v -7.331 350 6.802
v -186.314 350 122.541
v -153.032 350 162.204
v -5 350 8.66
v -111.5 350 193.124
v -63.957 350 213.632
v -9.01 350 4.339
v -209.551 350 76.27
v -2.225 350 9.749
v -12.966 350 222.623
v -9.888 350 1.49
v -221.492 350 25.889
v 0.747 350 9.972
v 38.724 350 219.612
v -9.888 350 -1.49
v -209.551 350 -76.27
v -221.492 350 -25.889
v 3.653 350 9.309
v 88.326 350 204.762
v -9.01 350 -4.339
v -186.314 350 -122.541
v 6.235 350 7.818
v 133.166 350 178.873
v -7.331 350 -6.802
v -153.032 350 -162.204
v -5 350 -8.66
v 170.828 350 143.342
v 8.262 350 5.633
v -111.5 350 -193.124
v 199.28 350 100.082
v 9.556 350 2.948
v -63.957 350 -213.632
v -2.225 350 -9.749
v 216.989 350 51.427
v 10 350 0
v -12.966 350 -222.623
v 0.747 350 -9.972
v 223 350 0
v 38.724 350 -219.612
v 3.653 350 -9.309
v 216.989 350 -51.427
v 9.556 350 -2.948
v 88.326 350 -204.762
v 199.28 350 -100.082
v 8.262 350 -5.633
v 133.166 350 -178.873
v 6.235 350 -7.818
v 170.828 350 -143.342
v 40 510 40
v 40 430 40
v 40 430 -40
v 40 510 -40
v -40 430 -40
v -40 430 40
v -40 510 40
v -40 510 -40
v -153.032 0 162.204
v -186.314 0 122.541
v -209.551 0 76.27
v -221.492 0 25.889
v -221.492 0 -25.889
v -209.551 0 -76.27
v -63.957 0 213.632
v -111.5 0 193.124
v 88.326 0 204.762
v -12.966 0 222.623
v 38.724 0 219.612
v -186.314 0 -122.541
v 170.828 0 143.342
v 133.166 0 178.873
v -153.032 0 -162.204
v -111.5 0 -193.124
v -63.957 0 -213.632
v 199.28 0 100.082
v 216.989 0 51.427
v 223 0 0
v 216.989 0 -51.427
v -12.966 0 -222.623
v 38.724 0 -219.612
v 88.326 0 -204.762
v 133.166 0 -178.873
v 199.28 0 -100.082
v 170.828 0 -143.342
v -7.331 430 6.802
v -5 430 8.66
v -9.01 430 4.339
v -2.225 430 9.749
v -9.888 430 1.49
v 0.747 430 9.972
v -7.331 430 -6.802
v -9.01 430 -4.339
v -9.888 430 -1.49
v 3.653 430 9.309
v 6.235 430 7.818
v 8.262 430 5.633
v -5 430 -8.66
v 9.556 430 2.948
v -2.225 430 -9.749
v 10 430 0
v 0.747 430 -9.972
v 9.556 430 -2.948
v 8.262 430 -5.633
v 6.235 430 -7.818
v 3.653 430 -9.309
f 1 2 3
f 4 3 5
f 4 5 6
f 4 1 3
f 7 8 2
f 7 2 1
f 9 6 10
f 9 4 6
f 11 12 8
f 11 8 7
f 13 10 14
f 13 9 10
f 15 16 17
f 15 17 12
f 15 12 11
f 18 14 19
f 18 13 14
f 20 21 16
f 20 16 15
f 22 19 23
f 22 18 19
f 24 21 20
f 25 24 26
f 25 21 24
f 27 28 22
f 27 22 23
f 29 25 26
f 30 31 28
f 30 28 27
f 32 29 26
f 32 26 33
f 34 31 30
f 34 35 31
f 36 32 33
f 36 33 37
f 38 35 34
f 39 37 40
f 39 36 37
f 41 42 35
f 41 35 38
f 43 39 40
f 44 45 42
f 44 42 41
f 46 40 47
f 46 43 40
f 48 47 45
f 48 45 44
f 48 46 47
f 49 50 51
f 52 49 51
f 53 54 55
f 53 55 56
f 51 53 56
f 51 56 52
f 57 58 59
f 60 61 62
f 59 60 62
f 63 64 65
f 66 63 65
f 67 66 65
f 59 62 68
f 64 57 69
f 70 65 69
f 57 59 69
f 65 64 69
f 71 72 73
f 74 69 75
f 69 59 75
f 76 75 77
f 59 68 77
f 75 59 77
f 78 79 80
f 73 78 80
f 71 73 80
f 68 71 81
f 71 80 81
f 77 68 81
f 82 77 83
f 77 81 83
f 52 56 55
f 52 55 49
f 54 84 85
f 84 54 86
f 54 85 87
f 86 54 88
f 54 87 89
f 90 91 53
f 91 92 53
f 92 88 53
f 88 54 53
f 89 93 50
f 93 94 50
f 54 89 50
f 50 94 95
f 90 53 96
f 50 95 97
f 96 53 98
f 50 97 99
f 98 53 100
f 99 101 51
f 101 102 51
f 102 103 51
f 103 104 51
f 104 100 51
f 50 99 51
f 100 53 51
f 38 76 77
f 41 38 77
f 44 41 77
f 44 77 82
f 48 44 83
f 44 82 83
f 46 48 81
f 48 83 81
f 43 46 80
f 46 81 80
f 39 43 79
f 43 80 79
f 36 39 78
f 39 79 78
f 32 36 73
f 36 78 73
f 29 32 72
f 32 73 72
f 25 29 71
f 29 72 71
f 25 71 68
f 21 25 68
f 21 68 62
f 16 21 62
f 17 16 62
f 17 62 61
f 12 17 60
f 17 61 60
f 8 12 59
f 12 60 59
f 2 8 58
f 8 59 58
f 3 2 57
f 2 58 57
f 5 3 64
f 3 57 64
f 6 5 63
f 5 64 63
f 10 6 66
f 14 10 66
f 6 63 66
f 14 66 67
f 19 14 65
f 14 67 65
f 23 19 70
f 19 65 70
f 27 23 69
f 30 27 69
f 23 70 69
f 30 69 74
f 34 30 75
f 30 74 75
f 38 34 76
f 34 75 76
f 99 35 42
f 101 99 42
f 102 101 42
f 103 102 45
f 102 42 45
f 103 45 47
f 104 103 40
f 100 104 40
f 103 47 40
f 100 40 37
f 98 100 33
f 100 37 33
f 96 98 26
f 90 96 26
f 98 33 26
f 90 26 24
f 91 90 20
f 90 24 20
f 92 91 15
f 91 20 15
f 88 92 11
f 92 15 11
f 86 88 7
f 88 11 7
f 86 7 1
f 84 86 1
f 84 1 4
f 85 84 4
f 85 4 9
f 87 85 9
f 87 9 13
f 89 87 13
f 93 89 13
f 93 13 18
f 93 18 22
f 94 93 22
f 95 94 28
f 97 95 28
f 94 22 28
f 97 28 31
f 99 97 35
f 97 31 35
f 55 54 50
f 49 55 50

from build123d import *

# Parameters (mm, degrees)
ESQUISSE1_R      = 223
EXTRUSION1_DEPTH = 350
ESQUISSE2_R      = 10
EXTRUSION2_DEPTH = 80
ESQUISSE3_W      = 80
ESQUISSE3_H      = 80
EXTRUSION3_DEPTH = 80


with BuildPart() as part:
    # Esquisse1 → Extrusion1 (new body)
    with BuildSketch(Plane(origin=(0, 0, 0), x_dir=(1, 0, 0), z_dir=(0, 1, 0))):
        Circle(ESQUISSE1_R)
    extrude(amount=EXTRUSION1_DEPTH)

    # Esquisse2 → Extrusion2 (add)
    with BuildSketch(Plane(origin=(0, 350, 0), x_dir=(1, 0, 0), z_dir=(0, 1, 0))):
        Circle(ESQUISSE2_R)
    extrude(amount=EXTRUSION2_DEPTH)

    # Esquisse3 → Extrusion3 (add)
    with BuildSketch(Plane(origin=(0, 430, 0), x_dir=(1, 0, 0), z_dir=(0, 1, 0))):
        Rectangle(ESQUISSE3_W, ESQUISSE3_H)
    extrude(amount=EXTRUSION3_DEPTH)


solid = part.part
